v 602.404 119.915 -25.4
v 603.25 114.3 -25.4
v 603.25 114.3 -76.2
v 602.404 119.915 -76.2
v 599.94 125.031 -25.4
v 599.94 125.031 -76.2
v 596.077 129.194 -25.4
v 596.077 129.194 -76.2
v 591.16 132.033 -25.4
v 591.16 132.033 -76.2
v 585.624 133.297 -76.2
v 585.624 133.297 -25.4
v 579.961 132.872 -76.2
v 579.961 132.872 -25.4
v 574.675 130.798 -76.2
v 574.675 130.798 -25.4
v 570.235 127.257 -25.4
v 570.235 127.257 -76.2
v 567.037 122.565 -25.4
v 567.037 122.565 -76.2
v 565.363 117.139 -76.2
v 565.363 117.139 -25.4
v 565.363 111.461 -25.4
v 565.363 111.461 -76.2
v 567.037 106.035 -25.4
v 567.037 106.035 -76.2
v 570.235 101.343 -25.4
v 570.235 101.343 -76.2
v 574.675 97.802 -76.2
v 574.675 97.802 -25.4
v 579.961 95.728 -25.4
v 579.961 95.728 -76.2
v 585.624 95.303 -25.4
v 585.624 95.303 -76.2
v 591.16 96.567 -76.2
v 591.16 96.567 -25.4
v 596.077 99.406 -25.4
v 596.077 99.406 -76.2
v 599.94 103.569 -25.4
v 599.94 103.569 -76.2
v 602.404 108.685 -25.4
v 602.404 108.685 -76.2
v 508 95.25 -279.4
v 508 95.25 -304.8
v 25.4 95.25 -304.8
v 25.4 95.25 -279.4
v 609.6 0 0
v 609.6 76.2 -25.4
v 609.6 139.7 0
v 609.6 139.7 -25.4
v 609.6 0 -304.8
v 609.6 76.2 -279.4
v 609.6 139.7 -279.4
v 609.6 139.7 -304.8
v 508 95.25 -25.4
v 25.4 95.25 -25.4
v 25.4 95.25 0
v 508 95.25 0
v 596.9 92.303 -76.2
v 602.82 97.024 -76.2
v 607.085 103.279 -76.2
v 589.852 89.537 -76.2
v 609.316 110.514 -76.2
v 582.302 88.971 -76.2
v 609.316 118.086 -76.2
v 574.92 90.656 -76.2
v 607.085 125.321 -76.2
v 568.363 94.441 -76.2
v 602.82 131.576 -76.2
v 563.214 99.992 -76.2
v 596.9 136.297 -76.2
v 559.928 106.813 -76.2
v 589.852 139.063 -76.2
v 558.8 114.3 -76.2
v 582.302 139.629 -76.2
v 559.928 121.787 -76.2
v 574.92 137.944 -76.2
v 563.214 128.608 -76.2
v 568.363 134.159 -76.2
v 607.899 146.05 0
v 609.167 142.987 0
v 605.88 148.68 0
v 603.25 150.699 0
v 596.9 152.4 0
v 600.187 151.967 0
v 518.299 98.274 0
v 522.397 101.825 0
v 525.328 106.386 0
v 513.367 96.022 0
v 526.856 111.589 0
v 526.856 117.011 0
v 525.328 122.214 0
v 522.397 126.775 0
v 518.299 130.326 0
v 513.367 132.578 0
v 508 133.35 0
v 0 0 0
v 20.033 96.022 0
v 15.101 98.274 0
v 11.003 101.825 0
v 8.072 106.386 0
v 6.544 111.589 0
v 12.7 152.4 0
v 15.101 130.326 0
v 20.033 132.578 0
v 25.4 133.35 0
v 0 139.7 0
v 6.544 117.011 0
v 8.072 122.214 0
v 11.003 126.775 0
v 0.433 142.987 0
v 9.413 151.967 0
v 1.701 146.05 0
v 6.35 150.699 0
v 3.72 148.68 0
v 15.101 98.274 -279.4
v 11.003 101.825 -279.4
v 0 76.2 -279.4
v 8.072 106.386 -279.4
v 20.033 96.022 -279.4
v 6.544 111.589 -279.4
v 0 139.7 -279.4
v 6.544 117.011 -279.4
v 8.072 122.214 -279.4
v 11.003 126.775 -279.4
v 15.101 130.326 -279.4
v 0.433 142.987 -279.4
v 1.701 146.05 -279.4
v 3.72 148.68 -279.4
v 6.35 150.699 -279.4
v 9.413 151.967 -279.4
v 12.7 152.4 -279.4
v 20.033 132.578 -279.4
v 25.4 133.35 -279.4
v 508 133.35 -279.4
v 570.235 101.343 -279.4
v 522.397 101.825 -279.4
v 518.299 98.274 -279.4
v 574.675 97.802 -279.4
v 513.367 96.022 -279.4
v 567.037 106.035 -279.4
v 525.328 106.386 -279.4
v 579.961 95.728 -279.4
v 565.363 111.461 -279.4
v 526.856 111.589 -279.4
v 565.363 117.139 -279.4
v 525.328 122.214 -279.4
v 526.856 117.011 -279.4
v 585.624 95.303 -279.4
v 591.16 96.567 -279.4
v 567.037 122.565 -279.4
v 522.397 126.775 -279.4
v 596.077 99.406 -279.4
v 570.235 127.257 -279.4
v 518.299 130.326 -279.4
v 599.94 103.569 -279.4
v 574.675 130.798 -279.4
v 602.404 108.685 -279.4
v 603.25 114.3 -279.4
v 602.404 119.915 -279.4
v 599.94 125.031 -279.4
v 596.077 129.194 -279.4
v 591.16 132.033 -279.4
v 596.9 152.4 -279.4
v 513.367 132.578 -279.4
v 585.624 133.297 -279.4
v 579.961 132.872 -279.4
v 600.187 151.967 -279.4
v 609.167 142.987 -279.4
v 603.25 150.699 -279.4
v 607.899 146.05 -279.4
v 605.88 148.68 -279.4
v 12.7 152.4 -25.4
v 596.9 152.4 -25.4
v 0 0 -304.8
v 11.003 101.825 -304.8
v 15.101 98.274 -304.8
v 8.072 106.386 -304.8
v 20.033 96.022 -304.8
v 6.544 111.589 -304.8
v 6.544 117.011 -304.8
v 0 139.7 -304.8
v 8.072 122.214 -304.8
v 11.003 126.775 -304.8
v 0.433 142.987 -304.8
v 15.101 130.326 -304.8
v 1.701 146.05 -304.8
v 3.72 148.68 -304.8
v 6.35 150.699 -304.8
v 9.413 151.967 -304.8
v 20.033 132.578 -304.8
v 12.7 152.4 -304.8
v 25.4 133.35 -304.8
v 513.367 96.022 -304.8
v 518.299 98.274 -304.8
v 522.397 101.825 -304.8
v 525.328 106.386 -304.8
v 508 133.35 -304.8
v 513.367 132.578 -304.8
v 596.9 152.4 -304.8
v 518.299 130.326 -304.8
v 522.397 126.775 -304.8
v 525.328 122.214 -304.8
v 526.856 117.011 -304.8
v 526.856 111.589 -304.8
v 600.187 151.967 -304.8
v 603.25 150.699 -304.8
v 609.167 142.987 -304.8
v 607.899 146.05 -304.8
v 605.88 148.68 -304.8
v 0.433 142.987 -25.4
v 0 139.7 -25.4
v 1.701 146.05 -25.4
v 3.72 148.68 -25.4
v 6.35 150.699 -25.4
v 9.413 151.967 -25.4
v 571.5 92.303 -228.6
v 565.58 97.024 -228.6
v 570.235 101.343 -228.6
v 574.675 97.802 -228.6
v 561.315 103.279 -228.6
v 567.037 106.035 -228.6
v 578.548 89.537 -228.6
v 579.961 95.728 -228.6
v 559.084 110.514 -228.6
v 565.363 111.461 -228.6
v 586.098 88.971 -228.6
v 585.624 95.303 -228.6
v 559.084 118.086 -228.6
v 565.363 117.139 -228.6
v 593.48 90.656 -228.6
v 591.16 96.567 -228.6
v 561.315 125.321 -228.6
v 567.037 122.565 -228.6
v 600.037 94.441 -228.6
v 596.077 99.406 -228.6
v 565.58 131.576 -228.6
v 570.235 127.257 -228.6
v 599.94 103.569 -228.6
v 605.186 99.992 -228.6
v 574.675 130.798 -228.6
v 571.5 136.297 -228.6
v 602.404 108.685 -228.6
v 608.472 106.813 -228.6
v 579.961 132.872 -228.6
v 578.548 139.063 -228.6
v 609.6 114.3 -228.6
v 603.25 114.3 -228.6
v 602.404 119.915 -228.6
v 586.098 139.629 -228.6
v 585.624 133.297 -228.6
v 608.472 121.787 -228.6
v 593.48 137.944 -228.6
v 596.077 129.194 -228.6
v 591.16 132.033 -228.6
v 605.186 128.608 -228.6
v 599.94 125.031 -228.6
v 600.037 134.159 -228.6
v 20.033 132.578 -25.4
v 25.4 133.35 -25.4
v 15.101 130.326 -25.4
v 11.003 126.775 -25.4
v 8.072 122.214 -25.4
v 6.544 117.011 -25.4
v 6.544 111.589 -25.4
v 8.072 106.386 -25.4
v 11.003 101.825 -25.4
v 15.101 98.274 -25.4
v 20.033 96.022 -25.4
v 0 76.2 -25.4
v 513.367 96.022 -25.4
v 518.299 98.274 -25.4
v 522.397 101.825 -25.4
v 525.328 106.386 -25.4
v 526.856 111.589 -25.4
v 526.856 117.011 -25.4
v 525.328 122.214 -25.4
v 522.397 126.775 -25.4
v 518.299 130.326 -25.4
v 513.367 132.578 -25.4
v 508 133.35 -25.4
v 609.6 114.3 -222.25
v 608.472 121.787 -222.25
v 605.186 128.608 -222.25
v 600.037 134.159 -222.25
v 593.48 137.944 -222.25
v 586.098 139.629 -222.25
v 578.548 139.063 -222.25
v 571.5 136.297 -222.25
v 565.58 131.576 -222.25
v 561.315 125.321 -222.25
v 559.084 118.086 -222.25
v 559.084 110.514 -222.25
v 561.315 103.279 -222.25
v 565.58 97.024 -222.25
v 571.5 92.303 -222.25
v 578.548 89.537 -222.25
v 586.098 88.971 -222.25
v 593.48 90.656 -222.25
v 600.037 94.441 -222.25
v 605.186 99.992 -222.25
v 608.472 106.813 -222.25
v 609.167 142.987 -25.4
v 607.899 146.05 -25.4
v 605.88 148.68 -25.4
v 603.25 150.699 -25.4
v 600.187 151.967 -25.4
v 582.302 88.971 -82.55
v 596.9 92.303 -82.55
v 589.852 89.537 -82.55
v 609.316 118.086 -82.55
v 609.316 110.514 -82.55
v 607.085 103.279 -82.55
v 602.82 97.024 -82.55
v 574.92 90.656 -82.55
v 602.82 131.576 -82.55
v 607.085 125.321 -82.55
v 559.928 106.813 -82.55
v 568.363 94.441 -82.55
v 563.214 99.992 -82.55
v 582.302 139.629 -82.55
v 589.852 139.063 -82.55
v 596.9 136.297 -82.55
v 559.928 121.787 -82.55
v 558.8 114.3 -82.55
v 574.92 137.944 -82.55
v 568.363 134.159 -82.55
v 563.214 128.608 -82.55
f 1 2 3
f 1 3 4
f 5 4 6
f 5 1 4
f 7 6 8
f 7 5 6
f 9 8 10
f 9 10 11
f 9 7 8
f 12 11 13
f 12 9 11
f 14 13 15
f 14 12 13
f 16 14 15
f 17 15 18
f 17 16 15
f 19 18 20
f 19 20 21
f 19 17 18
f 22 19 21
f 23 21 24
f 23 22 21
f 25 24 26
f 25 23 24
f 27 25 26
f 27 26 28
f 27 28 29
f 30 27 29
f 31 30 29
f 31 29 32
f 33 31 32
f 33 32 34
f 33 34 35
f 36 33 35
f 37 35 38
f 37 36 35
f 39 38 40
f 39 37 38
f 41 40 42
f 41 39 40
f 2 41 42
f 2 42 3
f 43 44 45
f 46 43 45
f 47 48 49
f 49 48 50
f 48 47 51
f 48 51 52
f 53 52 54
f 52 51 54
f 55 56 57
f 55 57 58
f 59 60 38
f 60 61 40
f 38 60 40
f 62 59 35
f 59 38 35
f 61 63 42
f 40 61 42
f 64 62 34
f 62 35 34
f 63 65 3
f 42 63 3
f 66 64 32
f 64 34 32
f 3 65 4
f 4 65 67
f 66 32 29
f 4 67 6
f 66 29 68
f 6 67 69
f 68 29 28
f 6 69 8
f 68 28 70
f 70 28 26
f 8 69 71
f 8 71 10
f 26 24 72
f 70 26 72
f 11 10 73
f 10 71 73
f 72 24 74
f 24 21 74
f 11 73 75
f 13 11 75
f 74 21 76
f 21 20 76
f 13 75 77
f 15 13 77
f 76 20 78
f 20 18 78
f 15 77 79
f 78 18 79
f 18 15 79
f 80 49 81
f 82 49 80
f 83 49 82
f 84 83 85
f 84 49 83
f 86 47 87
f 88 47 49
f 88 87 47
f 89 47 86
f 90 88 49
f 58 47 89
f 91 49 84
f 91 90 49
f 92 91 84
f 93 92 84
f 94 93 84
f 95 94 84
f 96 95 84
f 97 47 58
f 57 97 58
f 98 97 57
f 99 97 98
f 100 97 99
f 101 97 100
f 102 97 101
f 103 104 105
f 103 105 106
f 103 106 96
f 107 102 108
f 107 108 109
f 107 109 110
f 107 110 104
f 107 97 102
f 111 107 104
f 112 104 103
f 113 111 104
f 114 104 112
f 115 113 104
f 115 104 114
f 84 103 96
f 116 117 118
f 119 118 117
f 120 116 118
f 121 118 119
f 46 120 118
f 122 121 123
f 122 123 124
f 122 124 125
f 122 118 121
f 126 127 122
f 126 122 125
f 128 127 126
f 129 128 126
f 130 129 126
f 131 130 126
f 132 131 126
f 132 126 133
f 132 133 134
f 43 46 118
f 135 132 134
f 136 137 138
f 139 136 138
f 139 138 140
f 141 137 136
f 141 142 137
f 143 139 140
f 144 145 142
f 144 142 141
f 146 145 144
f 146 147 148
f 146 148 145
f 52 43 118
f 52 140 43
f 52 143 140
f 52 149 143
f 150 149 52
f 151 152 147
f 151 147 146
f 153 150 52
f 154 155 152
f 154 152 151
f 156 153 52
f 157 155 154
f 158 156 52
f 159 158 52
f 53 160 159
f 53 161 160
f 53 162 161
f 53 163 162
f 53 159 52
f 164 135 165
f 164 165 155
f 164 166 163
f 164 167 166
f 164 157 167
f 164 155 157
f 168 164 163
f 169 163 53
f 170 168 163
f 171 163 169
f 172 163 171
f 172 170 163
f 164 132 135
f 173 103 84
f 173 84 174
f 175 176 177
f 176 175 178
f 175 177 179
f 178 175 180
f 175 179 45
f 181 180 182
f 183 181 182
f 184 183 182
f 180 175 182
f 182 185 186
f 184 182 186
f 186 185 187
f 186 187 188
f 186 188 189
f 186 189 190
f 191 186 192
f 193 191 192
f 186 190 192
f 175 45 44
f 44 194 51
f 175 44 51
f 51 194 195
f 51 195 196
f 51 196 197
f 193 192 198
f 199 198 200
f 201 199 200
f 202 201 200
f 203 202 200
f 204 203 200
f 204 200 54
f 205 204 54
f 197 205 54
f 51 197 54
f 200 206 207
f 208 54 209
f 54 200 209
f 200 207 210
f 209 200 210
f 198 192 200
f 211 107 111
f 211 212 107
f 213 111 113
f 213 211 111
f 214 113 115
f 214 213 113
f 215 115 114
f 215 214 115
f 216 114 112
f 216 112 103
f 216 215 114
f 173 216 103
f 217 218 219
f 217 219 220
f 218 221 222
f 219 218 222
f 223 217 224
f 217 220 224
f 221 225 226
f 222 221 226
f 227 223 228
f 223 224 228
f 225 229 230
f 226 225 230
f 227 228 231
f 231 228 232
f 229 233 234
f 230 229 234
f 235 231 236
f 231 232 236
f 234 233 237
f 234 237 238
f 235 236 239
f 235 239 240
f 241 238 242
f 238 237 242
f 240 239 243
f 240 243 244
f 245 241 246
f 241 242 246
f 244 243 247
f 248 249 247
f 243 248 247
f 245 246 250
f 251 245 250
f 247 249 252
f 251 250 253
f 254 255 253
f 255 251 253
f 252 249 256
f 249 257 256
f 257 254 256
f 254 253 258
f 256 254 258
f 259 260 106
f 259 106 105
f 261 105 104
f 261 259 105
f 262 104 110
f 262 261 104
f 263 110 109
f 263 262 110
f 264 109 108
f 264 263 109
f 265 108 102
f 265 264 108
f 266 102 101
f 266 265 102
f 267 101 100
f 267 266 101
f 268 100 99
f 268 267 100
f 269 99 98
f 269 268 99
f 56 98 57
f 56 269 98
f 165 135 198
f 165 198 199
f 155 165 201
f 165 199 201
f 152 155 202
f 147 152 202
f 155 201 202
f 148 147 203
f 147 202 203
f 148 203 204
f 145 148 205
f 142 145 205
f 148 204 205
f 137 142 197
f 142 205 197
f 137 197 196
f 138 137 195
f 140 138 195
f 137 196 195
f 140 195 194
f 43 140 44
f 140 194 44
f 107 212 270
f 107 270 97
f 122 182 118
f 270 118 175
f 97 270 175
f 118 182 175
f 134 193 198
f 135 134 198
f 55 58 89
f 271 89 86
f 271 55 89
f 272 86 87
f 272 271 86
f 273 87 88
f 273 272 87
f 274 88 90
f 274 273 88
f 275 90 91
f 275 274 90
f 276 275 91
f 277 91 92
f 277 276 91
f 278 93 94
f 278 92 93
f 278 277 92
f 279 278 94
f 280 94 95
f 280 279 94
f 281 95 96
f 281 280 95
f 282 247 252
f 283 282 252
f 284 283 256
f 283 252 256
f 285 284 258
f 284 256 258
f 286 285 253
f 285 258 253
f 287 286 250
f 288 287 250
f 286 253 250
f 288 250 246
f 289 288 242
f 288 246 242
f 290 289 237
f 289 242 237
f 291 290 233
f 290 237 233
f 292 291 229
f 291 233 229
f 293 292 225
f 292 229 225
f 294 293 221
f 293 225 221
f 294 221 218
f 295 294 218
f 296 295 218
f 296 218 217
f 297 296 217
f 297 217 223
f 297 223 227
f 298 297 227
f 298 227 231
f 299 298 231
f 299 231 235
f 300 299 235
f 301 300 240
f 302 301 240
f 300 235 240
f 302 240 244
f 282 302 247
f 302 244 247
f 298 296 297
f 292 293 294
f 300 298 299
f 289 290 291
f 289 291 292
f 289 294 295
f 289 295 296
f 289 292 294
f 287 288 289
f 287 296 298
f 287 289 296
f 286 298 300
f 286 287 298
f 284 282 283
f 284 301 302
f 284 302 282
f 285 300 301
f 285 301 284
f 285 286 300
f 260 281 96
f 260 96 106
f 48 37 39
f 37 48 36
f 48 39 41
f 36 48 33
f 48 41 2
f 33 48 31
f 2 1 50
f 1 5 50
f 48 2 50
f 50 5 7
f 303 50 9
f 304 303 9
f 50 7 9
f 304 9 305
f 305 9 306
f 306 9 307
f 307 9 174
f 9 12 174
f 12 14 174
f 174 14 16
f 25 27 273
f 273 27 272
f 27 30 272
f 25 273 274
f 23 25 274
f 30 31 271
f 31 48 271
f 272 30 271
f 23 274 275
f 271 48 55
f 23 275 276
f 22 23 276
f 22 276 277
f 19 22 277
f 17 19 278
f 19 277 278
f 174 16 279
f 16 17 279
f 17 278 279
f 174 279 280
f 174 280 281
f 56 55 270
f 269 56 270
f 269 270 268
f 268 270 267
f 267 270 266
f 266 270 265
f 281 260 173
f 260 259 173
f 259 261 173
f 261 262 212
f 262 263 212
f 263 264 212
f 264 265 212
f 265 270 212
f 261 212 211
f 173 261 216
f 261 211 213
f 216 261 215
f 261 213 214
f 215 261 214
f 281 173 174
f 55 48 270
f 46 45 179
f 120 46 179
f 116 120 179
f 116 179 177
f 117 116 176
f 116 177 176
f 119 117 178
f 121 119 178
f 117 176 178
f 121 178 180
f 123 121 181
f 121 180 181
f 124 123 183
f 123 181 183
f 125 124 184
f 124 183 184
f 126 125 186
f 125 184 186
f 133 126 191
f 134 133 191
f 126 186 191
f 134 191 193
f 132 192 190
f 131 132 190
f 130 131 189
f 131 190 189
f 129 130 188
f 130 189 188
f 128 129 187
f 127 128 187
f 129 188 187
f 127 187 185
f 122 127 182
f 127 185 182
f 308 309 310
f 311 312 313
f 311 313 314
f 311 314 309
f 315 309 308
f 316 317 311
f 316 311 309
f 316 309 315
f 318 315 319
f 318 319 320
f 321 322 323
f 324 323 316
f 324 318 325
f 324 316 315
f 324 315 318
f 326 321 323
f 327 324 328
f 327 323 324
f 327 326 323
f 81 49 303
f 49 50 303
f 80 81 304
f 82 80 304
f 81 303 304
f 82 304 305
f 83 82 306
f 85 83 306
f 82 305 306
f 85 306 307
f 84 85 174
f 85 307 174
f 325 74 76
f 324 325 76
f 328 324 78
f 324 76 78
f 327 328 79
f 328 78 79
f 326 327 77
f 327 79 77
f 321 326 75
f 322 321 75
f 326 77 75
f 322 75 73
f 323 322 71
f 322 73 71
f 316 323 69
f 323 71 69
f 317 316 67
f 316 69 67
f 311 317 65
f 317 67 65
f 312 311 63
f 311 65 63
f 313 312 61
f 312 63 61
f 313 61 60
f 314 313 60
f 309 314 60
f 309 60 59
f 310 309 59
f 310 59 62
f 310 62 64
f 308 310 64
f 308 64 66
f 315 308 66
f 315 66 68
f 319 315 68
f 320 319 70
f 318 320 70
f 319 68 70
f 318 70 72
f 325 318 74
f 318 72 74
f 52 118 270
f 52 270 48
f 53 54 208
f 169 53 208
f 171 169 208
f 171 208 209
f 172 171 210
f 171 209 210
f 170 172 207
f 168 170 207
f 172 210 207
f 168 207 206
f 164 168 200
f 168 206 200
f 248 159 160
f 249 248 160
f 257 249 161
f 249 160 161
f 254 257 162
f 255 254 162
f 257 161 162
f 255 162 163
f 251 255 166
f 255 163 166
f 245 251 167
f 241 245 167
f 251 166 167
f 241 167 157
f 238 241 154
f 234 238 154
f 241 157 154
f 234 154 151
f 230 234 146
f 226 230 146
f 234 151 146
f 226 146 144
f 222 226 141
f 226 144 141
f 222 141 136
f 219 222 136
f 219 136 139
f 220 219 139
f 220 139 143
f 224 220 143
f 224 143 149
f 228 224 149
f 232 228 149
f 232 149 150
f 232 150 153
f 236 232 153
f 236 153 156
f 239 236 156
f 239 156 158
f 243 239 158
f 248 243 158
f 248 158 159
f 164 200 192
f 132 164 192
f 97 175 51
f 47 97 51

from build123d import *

# Parameters (mm, degrees)
SKETCH1_W             = 609.6
SKETCH1_H             = 304.8
BOSS_EXTRUDE1_DEPTH   = 76.2
SKETCH2_W             = 533.4
SKETCH2_H             = 25.4
BOSS_EXTRUDE2_DEPTH   = 76.2
CUT_EXTRUDE1_DEPTH    = 688.678907631
SKETCH4_W             = 25.4
SKETCH4_H             = 76.2
BOSS_EXTRUDE3_DEPTH   = 76.2
SKETCH5_R             = 19.05
BOSS_EXTRUDE4_DEPTH   = 50.8
SKETCH6_R             = 25.4
BOSS_EXTRUDE7_DEPTH   = 6.35
FILLET1_R             = 12.7
MIRROR1_START         = -304.8
MIRROR1_DEPTH         = 25.4
MIRROR1_START_2       = -279.4
MIRROR1_2_OUTLINE_R   = 19.05
MIRROR1_2_DEPTH       = 57.15
MIRROR1_START_3       = -228.6
MIRROR1_3_OUTLINE_R   = 25.4
MIRROR1_3_OUTLINE_R_2 = 19.05
MIRROR1_3_DEPTH       = 6.35


# Read off the part's stored shape, not the designer's step: Mirror1
with BuildPart() as part:
    # Sketch1 → Boss-Extrude1 (new body)
    with BuildSketch(Plane(origin=(0, 0, 0), x_dir=(1, 0, 0), z_dir=(0, 1, 0))):
        with Locations((304.8, 152.4)):
            Rectangle(SKETCH1_W, SKETCH1_H)
    extrude(amount=BOSS_EXTRUDE1_DEPTH)

    # Sketch2 → Boss-Extrude2 (add)
    with BuildSketch(Plane(origin=(0, 76.2, 0), x_dir=(1, 0, 0), z_dir=(0, 1, 0))):
        with Locations((266.7, 12.7)):
            Rectangle(SKETCH2_W, SKETCH2_H)
    extrude(amount=BOSS_EXTRUDE2_DEPTH)

    # Sketch3 → Cut-Extrude1 (cut, through all)
    with BuildSketch(Plane(origin=(0, 0, -25.4), x_dir=(-1, 0, 0), z_dir=(0, 0, -1))):
        with BuildLine():
            Line((-508, 133.35), (-25.4, 133.35))
            ThreePointArc((-25.4, 133.35), (-6.35, 114.3), (-25.4, 95.25))
            Line((-25.4, 95.25), (-508, 95.25))
            ThreePointArc((-508, 95.25), (-527.05, 114.3), (-508, 133.35))
        make_face()
    extrude(amount=-CUT_EXTRUDE1_DEPTH, mode=Mode.SUBTRACT)

    # Sketch4 → Boss-Extrude3 (add, through all)
    with BuildSketch(Plane(origin=(533.4, 0, 0), x_dir=(0, 0, -1), z_dir=(1, 0, 0))):
        with Locations((12.7, 114.3)):
            Rectangle(SKETCH4_W, SKETCH4_H)
    extrude(amount=BOSS_EXTRUDE3_DEPTH)

    # Sketch5 → Boss-Extrude4 (add)
    with BuildSketch(Plane.XY.offset(-25.4)):
        with Locations((584.2, 114.3)):
            Circle(SKETCH5_R)
    extrude(amount=-BOSS_EXTRUDE4_DEPTH)

    # Sketch6 → Boss-Extrude7 (add)
    with BuildSketch(Plane(origin=(0, 0, -76.2), x_dir=(-1, 0, 0), z_dir=(0, 0, -1))):
        with Locations((-584.2, 114.3)):
            Circle(SKETCH6_R)
    extrude(amount=BOSS_EXTRUDE7_DEPTH)

    # Fillet1
    fillet1_edges = [part.edges().sort_by_distance(p)[0] for p in [
        (0, 152.4, -12.7),
        (609.6, 152.4, -12.7),
    ]]
    fillet(fillet1_edges, radius=FILLET1_R)

    # Mirror1 outline → Mirror1 (add)
    with BuildSketch(Plane.XY.offset(MIRROR1_START)):
        with BuildLine():
            Line((596.9, 152.4), (12.7, 152.4))
            ThreePointArc((12.7, 152.4), (3.719743879, 148.680256121), (0, 139.7))
            Line((0, 139.7), (0, 76.2))
            Line((0, 76.2), (609.6, 76.2))
            Line((609.6, 76.2), (609.6, 139.7))
            ThreePointArc((609.6, 139.7), (605.880256121, 148.680256121), (596.9, 152.4))
        make_face()
        with BuildLine():
            ThreePointArc((508, 133.35), (527.05, 114.3), (508, 95.25))
            Line((508, 95.25), (25.4, 95.25))
            ThreePointArc((25.4, 95.25), (6.35, 114.3), (25.4, 133.35))
            Line((25.4, 133.35), (508, 133.35))
        make_face(mode=Mode.SUBTRACT)
    extrude(amount=MIRROR1_DEPTH)

    # Mirror1 2 outline → Mirror1 2 (add)
    with BuildSketch(Plane.XY.offset(MIRROR1_START_2)):
        with Locations((584.2, 114.3)):
            Circle(MIRROR1_2_OUTLINE_R)
    extrude(amount=MIRROR1_2_DEPTH)

    # Mirror1 3 outline → Mirror1 3 (add)
    with BuildSketch(Plane.XY.offset(MIRROR1_START_3)):
        with Locations((584.2, 114.3)):
            Circle(MIRROR1_3_OUTLINE_R)
        with Locations((584.2, 114.3)):
            Circle(MIRROR1_3_OUTLINE_R_2, mode=Mode.SUBTRACT)
    extrude(amount=MIRROR1_3_DEPTH)


solid = part.part
